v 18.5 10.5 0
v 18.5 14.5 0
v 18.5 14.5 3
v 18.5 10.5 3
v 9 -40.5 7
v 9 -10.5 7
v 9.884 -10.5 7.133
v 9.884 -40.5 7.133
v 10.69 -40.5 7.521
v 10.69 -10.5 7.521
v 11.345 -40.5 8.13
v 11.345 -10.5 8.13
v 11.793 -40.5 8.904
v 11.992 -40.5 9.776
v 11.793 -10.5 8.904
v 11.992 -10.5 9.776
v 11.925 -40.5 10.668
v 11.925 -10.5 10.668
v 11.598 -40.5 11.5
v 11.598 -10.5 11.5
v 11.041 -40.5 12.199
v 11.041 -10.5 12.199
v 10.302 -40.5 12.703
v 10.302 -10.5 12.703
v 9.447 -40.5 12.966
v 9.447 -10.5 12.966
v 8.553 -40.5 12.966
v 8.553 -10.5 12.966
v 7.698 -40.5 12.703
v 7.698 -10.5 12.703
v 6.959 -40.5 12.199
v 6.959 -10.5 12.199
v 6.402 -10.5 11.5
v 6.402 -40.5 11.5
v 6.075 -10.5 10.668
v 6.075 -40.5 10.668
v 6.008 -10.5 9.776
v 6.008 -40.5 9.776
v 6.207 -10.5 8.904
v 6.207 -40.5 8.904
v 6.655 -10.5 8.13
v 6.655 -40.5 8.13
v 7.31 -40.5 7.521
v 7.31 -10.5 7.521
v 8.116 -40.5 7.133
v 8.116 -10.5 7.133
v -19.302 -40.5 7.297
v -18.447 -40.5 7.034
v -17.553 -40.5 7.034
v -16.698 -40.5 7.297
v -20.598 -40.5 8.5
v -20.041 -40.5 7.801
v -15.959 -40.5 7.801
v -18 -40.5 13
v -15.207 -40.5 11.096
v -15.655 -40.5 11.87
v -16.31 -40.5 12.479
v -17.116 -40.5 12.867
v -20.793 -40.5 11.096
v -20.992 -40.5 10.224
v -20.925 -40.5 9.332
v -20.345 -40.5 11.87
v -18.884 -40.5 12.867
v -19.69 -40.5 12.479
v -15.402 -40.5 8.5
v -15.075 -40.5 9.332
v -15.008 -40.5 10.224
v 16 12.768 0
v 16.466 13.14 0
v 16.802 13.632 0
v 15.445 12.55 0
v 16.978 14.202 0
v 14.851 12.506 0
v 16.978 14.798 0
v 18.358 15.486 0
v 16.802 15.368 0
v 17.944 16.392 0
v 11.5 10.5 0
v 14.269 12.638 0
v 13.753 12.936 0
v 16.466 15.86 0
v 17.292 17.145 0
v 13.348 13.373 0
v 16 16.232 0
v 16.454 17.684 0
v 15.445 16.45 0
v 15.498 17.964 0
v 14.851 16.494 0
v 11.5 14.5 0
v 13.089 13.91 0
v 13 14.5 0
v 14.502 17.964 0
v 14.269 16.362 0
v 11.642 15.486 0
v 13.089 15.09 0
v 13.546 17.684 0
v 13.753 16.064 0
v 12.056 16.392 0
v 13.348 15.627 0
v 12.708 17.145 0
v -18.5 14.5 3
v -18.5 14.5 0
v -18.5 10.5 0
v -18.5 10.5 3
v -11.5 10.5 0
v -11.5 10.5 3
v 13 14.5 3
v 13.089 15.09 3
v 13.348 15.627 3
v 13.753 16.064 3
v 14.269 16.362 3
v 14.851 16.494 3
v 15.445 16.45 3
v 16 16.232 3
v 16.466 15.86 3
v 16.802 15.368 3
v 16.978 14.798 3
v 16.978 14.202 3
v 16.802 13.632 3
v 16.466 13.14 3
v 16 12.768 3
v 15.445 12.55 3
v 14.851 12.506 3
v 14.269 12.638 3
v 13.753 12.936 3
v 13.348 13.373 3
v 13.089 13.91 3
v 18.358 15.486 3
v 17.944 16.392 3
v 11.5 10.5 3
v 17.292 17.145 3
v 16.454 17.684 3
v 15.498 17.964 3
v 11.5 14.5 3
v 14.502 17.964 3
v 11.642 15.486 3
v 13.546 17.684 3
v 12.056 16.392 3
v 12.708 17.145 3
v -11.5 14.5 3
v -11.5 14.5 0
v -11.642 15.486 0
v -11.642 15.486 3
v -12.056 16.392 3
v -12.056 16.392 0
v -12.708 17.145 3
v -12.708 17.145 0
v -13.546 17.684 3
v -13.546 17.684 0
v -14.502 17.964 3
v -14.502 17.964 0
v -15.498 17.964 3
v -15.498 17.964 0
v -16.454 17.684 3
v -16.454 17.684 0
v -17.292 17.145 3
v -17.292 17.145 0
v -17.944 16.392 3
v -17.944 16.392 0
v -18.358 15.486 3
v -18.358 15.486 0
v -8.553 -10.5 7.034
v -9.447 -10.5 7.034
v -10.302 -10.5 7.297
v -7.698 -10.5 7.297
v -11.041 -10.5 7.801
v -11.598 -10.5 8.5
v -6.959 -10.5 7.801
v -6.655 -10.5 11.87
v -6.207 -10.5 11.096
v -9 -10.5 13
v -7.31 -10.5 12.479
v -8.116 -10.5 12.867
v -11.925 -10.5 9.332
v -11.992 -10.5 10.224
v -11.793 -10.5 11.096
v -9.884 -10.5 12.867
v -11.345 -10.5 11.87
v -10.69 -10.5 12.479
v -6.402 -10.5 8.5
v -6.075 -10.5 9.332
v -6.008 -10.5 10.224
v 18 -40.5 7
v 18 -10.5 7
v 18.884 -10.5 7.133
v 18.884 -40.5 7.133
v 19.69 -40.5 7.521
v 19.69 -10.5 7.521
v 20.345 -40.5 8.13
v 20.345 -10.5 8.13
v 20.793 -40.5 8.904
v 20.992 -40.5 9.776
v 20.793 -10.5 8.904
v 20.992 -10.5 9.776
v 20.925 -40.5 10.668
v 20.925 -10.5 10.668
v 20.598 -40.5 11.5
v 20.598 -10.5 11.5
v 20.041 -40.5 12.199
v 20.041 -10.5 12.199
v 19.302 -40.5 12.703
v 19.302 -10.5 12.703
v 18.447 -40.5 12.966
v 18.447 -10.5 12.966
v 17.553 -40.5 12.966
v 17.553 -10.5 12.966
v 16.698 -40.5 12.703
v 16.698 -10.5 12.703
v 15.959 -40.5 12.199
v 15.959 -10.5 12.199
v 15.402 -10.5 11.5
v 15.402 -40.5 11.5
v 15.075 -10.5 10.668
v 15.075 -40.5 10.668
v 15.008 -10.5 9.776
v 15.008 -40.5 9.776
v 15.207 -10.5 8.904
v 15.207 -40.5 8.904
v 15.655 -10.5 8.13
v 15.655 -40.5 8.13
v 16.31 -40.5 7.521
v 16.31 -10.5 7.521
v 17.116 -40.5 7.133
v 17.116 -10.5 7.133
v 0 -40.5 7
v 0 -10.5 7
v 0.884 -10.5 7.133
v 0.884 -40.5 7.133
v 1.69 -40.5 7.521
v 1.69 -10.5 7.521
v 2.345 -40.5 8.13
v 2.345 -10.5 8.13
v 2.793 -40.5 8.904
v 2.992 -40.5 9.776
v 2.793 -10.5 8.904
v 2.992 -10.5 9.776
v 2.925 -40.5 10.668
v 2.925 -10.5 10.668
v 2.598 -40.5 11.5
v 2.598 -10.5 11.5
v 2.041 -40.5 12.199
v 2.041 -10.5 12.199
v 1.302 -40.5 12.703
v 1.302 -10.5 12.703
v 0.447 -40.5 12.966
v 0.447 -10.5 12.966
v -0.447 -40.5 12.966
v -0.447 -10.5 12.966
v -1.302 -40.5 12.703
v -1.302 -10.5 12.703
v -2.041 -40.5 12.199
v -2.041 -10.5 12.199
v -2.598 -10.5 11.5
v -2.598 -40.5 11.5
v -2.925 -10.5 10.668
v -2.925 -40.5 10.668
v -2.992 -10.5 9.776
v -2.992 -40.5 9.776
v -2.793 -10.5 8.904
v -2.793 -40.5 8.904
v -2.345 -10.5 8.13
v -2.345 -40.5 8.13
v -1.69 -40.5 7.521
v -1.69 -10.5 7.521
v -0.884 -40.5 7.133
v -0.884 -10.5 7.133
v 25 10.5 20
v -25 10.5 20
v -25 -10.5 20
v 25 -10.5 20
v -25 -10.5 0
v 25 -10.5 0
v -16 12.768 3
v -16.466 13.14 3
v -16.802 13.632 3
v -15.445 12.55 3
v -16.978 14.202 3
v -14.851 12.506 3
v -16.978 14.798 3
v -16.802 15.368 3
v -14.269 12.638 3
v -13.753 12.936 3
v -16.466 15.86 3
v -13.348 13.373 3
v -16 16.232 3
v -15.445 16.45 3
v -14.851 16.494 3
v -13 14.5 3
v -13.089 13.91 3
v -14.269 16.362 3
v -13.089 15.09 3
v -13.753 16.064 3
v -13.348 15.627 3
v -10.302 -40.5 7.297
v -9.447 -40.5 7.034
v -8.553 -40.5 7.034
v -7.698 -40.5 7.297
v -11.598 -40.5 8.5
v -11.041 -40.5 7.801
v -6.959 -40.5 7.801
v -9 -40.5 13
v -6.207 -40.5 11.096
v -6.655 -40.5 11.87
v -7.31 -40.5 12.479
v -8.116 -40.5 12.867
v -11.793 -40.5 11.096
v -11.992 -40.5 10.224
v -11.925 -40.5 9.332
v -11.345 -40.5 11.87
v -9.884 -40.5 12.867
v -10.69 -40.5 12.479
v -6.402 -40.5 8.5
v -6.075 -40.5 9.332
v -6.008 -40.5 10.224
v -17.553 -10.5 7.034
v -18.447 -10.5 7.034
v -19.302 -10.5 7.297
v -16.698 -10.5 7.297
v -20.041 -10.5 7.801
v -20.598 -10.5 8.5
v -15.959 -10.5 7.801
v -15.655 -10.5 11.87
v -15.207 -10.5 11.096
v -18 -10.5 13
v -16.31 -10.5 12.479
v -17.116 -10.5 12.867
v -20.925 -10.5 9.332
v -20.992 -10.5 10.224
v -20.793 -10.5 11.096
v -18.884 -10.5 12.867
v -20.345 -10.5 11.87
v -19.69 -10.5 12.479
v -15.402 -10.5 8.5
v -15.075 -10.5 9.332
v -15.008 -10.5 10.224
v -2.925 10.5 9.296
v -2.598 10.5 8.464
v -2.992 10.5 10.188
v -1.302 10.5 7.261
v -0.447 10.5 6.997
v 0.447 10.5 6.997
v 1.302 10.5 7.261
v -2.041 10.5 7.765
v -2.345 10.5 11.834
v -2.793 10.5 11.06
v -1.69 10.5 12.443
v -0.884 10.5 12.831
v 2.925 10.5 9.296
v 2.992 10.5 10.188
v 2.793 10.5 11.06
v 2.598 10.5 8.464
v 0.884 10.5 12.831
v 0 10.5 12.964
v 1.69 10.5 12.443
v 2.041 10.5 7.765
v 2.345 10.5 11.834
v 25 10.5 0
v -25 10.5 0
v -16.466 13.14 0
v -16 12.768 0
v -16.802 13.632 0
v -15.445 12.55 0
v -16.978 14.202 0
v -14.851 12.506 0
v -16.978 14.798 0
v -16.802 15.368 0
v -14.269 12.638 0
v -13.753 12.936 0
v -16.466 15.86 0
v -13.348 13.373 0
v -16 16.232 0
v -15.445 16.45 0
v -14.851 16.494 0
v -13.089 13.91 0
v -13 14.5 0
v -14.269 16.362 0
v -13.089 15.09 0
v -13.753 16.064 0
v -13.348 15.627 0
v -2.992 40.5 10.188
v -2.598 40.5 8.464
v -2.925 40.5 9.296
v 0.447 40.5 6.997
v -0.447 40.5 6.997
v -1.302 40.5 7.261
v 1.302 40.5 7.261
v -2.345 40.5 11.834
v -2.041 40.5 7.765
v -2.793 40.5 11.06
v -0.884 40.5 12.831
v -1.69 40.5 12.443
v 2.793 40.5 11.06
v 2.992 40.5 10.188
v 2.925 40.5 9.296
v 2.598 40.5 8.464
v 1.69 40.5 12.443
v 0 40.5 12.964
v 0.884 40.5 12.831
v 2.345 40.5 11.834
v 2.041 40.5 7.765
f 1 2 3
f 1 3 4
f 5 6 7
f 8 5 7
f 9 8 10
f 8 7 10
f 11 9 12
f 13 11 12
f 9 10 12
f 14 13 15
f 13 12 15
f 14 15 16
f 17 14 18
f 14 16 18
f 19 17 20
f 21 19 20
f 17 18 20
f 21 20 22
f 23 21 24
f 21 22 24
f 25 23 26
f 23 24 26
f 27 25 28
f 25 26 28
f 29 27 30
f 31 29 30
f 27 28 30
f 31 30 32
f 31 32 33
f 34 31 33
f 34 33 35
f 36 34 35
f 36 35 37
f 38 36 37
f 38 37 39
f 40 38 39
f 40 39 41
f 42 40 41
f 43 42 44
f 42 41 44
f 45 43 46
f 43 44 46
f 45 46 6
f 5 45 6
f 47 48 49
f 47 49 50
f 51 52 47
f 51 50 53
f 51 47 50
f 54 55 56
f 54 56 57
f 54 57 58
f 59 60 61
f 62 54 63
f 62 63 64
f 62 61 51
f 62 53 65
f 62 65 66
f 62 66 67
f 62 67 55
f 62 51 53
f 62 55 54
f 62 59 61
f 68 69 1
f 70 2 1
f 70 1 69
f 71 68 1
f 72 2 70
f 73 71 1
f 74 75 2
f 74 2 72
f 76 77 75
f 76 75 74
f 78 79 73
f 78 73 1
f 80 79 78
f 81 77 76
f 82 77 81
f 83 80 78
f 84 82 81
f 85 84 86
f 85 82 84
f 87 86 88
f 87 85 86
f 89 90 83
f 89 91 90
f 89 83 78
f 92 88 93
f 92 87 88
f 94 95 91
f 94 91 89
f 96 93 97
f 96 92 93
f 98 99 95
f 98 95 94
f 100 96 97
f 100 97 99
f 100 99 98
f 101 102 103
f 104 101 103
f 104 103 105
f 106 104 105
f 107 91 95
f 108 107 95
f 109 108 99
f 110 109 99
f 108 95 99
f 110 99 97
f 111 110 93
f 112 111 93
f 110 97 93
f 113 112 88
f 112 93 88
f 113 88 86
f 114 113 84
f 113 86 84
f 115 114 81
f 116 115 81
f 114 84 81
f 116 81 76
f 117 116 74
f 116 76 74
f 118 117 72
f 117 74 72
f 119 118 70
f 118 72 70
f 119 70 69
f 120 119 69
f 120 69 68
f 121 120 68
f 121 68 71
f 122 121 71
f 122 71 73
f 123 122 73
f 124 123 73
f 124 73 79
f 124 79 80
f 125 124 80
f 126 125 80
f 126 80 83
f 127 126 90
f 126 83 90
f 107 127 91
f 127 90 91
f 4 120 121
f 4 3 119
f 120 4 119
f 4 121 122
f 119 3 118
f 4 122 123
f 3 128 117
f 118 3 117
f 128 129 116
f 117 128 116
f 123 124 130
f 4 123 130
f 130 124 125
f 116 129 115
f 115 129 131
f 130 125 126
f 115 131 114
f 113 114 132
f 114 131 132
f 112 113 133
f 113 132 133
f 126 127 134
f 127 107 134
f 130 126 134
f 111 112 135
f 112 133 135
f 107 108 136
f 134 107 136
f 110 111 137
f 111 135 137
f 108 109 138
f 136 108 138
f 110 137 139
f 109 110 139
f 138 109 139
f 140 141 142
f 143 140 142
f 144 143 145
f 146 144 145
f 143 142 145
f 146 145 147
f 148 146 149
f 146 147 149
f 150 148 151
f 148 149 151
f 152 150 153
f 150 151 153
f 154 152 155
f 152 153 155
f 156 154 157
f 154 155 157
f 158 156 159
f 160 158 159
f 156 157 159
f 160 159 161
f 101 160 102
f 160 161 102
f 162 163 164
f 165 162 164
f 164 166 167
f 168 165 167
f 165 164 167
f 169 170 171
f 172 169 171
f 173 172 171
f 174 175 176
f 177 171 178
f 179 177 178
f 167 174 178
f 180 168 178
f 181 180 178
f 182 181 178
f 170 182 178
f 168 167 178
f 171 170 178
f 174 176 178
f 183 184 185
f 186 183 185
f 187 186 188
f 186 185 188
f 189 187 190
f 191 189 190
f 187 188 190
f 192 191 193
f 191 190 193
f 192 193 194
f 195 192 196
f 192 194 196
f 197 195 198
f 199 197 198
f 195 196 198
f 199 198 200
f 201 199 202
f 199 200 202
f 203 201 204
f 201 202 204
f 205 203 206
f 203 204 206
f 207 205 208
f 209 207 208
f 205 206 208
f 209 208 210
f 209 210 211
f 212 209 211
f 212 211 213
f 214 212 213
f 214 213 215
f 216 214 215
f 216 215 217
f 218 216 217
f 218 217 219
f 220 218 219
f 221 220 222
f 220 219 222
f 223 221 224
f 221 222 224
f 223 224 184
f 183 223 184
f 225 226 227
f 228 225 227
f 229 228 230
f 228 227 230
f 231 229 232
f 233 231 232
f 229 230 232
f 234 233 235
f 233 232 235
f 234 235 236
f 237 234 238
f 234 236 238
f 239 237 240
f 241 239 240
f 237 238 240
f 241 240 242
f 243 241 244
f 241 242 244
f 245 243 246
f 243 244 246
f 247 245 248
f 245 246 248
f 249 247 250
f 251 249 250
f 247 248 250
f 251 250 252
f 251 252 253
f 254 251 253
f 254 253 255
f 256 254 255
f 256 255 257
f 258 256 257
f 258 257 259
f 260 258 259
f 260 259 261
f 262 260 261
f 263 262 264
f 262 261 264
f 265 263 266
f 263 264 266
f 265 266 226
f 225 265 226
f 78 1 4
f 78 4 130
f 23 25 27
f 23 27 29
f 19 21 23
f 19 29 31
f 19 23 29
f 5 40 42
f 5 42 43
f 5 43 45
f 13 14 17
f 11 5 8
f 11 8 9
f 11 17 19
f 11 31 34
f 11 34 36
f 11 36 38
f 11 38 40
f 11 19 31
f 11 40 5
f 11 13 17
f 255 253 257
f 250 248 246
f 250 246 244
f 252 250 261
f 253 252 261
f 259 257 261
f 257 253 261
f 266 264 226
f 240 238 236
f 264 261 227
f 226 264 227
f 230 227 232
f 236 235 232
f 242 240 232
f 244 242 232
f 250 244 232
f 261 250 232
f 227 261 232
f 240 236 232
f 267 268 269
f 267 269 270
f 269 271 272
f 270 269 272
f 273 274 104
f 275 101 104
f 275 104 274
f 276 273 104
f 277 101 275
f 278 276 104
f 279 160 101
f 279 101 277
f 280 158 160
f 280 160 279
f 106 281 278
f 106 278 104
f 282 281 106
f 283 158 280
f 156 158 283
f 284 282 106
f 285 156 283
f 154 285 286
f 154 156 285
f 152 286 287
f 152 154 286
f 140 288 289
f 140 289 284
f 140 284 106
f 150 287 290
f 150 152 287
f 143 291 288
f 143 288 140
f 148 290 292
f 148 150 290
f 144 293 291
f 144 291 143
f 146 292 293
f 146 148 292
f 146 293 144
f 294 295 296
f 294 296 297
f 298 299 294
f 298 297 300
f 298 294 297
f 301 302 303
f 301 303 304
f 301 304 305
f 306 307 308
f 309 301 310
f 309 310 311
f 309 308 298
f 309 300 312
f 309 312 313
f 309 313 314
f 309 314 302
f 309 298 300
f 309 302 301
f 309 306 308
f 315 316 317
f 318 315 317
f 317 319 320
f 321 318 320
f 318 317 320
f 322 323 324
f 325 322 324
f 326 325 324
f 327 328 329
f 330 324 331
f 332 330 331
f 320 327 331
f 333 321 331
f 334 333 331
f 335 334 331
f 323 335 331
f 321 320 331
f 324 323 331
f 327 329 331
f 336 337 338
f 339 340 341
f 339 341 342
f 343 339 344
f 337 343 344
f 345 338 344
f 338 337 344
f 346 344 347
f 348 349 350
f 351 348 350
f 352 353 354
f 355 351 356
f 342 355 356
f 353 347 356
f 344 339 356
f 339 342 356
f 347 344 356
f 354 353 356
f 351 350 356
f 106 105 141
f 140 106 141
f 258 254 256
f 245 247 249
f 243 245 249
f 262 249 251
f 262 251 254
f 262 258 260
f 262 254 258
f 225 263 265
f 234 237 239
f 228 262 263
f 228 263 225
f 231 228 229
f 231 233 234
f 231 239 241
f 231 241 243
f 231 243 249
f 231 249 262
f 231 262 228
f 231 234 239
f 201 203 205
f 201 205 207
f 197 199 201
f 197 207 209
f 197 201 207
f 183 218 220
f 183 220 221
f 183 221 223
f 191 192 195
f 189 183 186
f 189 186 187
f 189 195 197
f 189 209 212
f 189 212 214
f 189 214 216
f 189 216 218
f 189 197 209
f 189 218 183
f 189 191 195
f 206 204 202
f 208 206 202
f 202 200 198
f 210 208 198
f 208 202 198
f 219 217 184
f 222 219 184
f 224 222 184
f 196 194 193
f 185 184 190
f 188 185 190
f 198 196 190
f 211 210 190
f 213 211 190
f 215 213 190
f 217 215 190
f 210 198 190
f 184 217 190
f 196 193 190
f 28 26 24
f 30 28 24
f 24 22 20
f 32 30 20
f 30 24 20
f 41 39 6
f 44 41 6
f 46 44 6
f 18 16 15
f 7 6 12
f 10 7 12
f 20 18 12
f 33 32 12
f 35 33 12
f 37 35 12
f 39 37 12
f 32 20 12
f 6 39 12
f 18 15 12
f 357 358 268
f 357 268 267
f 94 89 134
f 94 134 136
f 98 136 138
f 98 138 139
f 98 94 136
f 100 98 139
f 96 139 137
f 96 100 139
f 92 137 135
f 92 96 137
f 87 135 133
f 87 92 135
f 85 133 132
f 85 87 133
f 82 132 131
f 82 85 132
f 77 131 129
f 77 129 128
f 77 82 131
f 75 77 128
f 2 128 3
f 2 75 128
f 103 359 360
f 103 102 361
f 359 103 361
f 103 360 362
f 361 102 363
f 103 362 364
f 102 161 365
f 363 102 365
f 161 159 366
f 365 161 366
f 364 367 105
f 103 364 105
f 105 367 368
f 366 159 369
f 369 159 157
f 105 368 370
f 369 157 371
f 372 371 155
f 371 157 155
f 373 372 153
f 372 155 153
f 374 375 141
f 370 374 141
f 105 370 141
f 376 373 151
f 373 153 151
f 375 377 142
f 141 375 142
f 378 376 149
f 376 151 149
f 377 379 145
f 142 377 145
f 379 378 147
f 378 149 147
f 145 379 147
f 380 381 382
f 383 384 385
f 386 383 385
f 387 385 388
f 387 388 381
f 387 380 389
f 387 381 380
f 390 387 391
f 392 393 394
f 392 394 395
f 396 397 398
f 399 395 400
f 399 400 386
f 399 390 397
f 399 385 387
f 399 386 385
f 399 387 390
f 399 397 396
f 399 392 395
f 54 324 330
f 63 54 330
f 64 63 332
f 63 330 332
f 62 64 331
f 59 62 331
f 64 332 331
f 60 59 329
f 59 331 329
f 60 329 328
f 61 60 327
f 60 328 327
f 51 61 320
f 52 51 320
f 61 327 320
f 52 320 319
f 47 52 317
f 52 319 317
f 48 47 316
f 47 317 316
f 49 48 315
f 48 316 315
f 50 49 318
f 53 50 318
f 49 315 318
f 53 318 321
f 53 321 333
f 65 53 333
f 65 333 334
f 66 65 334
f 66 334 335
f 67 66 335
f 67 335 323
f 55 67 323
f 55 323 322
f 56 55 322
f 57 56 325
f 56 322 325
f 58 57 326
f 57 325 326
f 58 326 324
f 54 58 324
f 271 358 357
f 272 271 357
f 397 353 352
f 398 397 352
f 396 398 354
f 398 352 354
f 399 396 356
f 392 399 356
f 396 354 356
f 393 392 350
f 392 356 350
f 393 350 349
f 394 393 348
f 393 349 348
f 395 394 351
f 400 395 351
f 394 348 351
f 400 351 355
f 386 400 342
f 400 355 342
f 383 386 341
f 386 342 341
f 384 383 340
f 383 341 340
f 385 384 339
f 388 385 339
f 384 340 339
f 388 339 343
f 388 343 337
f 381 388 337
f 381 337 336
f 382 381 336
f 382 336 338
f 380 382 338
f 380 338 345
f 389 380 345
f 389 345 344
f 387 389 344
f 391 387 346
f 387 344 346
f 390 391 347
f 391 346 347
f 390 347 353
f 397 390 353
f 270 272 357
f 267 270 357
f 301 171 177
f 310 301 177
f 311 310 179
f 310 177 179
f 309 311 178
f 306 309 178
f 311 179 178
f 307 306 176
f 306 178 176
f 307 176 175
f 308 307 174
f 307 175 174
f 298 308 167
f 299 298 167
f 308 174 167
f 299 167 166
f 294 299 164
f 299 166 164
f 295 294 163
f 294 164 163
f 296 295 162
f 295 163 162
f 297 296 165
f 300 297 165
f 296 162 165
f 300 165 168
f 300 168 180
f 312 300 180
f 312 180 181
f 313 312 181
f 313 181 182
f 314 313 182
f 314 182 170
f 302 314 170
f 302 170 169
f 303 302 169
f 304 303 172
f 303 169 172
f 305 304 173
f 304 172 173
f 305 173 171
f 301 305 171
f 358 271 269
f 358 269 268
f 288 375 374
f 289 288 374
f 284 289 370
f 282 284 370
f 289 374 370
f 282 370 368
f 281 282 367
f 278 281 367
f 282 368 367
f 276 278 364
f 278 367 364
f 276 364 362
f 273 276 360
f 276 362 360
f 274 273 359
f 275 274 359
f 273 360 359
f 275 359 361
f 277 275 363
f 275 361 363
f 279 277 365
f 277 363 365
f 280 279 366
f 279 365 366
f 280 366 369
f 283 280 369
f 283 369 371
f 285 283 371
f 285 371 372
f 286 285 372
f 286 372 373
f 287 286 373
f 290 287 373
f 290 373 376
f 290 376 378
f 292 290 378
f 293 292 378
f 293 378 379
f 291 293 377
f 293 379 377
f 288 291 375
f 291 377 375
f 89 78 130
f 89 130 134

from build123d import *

# Parameters (mm, degrees)
SKETCH_1_W        = 50
SKETCH_1_H        = 21
EXTRUDE_1_DEPTH   = 20
SKETCH_2_R        = 3
EXTRUDE_2_DEPTH   = 30
EXTRUDE_2_2_DEPTH = 30
EXTRUDE_2_3_DEPTH = 30
EXTRUDE_2_4_DEPTH = 30
EXTRUDE_2_5_DEPTH = 30
SKETCH_3_R        = 3
EXTRUDE_3_DEPTH   = 30
SKETCH_4_R        = 2
EXTRUDE_4_DEPTH   = 3
EXTRUDE_4_2_DEPTH = 3


with BuildPart() as part:
    # 草图1 → 凸台-拉伸1 (new body)
    with BuildSketch(Plane.XY):
        Rectangle(SKETCH_1_W, SKETCH_1_H)
    extrude(amount=EXTRUDE_1_DEPTH)


with BuildPart() as body_2:
    # 草图2 → 凸台-拉伸2 (new body)
    with BuildSketch(Plane.XZ.offset(10.5)):
        with Locations(Location((0, 10, 0), (0, 0, 270))):
            Circle(SKETCH_2_R)
    extrude(amount=EXTRUDE_2_DEPTH)


with BuildPart() as body_3:
    # 草图2 → Extrude 2 2 (new body)
    with BuildSketch(Plane.XZ.offset(10.5)):
        with Locations(Location((9, 10, 0), (0, 0, 270))):
            Circle(SKETCH_2_R)
    extrude(amount=EXTRUDE_2_2_DEPTH)


with BuildPart() as body_4:
    # 草图2 → Extrude 2 3 (new body)
    with BuildSketch(Plane.XZ.offset(10.5)):
        with Locations(Location((18, 10, 0), (0, 0, 270))):
            Circle(SKETCH_2_R)
    extrude(amount=EXTRUDE_2_3_DEPTH)


with BuildPart() as body_5:
    # 草图2 → Extrude 2 4 (new body)
    with BuildSketch(Plane.XZ.offset(10.5)):
        with Locations(Location((-18, 10, 0), (0, 0, 90))):
            Circle(SKETCH_2_R)
    extrude(amount=EXTRUDE_2_4_DEPTH)


with BuildPart() as body_6:
    # 草图2 → Extrude 2 5 (new body)
    with BuildSketch(Plane.XZ.offset(10.5)):
        with Locations(Location((-9, 10, 0), (0, 0, 90))):
            Circle(SKETCH_2_R)
    extrude(amount=EXTRUDE_2_5_DEPTH)


with BuildPart() as body_7:
    # 草图3 → 凸台-拉伸3 (new body)
    with BuildSketch(Plane(origin=(0, 10.5, 0), x_dir=(1, 0, 0), z_dir=(0, 1, 0))):
        with Locations(Location((0, -9.963882653, 0), (0, 0, 270))):
            Circle(SKETCH_3_R)
    extrude(amount=EXTRUDE_3_DEPTH)


with BuildPart() as body_8:
    # 草图4 → 凸台-拉伸4 (new body)
    with BuildSketch(Plane(origin=(0, 0, 0), x_dir=(-1, 0, 0), z_dir=(0, 0, -1))):
        with BuildLine():
            Line((-18.5, 14.5), (-18.5, 10.5))
            Line((-18.5, 10.5), (-11.5, 10.5))
            Line((-11.5, 10.5), (-11.5, 14.5))
            ThreePointArc((-11.5, 14.5), (-15, 18), (-18.5, 14.5))
        make_face()
        with Locations((-15, 14.5)):
            Circle(SKETCH_4_R, mode=Mode.SUBTRACT)
    extrude(amount=-EXTRUDE_4_DEPTH)


with BuildPart() as body_9:
    # 草图4 → Extrude 4 2 (new body)
    with BuildSketch(Plane(origin=(0, 0, 0), x_dir=(-1, 0, 0), z_dir=(0, 0, -1))):
        with BuildLine():
            Line((18.5, 10.5), (11.5, 10.5))
            Line((11.5, 10.5), (11.5, 14.5))
            ThreePointArc((11.5, 14.5), (15, 18), (18.5, 14.5))
            Line((18.5, 14.5), (18.5, 10.5))
        make_face()
        with Locations(Location((15, 14.5, 0), (0, 0, 180))):
            Circle(SKETCH_4_R, mode=Mode.SUBTRACT)
    extrude(amount=-EXTRUDE_4_2_DEPTH)


solid = Compound([part.part, body_2.part, body_3.part, body_4.part, body_5.part, body_6.part, body_7.part, body_8.part, body_9.part])
